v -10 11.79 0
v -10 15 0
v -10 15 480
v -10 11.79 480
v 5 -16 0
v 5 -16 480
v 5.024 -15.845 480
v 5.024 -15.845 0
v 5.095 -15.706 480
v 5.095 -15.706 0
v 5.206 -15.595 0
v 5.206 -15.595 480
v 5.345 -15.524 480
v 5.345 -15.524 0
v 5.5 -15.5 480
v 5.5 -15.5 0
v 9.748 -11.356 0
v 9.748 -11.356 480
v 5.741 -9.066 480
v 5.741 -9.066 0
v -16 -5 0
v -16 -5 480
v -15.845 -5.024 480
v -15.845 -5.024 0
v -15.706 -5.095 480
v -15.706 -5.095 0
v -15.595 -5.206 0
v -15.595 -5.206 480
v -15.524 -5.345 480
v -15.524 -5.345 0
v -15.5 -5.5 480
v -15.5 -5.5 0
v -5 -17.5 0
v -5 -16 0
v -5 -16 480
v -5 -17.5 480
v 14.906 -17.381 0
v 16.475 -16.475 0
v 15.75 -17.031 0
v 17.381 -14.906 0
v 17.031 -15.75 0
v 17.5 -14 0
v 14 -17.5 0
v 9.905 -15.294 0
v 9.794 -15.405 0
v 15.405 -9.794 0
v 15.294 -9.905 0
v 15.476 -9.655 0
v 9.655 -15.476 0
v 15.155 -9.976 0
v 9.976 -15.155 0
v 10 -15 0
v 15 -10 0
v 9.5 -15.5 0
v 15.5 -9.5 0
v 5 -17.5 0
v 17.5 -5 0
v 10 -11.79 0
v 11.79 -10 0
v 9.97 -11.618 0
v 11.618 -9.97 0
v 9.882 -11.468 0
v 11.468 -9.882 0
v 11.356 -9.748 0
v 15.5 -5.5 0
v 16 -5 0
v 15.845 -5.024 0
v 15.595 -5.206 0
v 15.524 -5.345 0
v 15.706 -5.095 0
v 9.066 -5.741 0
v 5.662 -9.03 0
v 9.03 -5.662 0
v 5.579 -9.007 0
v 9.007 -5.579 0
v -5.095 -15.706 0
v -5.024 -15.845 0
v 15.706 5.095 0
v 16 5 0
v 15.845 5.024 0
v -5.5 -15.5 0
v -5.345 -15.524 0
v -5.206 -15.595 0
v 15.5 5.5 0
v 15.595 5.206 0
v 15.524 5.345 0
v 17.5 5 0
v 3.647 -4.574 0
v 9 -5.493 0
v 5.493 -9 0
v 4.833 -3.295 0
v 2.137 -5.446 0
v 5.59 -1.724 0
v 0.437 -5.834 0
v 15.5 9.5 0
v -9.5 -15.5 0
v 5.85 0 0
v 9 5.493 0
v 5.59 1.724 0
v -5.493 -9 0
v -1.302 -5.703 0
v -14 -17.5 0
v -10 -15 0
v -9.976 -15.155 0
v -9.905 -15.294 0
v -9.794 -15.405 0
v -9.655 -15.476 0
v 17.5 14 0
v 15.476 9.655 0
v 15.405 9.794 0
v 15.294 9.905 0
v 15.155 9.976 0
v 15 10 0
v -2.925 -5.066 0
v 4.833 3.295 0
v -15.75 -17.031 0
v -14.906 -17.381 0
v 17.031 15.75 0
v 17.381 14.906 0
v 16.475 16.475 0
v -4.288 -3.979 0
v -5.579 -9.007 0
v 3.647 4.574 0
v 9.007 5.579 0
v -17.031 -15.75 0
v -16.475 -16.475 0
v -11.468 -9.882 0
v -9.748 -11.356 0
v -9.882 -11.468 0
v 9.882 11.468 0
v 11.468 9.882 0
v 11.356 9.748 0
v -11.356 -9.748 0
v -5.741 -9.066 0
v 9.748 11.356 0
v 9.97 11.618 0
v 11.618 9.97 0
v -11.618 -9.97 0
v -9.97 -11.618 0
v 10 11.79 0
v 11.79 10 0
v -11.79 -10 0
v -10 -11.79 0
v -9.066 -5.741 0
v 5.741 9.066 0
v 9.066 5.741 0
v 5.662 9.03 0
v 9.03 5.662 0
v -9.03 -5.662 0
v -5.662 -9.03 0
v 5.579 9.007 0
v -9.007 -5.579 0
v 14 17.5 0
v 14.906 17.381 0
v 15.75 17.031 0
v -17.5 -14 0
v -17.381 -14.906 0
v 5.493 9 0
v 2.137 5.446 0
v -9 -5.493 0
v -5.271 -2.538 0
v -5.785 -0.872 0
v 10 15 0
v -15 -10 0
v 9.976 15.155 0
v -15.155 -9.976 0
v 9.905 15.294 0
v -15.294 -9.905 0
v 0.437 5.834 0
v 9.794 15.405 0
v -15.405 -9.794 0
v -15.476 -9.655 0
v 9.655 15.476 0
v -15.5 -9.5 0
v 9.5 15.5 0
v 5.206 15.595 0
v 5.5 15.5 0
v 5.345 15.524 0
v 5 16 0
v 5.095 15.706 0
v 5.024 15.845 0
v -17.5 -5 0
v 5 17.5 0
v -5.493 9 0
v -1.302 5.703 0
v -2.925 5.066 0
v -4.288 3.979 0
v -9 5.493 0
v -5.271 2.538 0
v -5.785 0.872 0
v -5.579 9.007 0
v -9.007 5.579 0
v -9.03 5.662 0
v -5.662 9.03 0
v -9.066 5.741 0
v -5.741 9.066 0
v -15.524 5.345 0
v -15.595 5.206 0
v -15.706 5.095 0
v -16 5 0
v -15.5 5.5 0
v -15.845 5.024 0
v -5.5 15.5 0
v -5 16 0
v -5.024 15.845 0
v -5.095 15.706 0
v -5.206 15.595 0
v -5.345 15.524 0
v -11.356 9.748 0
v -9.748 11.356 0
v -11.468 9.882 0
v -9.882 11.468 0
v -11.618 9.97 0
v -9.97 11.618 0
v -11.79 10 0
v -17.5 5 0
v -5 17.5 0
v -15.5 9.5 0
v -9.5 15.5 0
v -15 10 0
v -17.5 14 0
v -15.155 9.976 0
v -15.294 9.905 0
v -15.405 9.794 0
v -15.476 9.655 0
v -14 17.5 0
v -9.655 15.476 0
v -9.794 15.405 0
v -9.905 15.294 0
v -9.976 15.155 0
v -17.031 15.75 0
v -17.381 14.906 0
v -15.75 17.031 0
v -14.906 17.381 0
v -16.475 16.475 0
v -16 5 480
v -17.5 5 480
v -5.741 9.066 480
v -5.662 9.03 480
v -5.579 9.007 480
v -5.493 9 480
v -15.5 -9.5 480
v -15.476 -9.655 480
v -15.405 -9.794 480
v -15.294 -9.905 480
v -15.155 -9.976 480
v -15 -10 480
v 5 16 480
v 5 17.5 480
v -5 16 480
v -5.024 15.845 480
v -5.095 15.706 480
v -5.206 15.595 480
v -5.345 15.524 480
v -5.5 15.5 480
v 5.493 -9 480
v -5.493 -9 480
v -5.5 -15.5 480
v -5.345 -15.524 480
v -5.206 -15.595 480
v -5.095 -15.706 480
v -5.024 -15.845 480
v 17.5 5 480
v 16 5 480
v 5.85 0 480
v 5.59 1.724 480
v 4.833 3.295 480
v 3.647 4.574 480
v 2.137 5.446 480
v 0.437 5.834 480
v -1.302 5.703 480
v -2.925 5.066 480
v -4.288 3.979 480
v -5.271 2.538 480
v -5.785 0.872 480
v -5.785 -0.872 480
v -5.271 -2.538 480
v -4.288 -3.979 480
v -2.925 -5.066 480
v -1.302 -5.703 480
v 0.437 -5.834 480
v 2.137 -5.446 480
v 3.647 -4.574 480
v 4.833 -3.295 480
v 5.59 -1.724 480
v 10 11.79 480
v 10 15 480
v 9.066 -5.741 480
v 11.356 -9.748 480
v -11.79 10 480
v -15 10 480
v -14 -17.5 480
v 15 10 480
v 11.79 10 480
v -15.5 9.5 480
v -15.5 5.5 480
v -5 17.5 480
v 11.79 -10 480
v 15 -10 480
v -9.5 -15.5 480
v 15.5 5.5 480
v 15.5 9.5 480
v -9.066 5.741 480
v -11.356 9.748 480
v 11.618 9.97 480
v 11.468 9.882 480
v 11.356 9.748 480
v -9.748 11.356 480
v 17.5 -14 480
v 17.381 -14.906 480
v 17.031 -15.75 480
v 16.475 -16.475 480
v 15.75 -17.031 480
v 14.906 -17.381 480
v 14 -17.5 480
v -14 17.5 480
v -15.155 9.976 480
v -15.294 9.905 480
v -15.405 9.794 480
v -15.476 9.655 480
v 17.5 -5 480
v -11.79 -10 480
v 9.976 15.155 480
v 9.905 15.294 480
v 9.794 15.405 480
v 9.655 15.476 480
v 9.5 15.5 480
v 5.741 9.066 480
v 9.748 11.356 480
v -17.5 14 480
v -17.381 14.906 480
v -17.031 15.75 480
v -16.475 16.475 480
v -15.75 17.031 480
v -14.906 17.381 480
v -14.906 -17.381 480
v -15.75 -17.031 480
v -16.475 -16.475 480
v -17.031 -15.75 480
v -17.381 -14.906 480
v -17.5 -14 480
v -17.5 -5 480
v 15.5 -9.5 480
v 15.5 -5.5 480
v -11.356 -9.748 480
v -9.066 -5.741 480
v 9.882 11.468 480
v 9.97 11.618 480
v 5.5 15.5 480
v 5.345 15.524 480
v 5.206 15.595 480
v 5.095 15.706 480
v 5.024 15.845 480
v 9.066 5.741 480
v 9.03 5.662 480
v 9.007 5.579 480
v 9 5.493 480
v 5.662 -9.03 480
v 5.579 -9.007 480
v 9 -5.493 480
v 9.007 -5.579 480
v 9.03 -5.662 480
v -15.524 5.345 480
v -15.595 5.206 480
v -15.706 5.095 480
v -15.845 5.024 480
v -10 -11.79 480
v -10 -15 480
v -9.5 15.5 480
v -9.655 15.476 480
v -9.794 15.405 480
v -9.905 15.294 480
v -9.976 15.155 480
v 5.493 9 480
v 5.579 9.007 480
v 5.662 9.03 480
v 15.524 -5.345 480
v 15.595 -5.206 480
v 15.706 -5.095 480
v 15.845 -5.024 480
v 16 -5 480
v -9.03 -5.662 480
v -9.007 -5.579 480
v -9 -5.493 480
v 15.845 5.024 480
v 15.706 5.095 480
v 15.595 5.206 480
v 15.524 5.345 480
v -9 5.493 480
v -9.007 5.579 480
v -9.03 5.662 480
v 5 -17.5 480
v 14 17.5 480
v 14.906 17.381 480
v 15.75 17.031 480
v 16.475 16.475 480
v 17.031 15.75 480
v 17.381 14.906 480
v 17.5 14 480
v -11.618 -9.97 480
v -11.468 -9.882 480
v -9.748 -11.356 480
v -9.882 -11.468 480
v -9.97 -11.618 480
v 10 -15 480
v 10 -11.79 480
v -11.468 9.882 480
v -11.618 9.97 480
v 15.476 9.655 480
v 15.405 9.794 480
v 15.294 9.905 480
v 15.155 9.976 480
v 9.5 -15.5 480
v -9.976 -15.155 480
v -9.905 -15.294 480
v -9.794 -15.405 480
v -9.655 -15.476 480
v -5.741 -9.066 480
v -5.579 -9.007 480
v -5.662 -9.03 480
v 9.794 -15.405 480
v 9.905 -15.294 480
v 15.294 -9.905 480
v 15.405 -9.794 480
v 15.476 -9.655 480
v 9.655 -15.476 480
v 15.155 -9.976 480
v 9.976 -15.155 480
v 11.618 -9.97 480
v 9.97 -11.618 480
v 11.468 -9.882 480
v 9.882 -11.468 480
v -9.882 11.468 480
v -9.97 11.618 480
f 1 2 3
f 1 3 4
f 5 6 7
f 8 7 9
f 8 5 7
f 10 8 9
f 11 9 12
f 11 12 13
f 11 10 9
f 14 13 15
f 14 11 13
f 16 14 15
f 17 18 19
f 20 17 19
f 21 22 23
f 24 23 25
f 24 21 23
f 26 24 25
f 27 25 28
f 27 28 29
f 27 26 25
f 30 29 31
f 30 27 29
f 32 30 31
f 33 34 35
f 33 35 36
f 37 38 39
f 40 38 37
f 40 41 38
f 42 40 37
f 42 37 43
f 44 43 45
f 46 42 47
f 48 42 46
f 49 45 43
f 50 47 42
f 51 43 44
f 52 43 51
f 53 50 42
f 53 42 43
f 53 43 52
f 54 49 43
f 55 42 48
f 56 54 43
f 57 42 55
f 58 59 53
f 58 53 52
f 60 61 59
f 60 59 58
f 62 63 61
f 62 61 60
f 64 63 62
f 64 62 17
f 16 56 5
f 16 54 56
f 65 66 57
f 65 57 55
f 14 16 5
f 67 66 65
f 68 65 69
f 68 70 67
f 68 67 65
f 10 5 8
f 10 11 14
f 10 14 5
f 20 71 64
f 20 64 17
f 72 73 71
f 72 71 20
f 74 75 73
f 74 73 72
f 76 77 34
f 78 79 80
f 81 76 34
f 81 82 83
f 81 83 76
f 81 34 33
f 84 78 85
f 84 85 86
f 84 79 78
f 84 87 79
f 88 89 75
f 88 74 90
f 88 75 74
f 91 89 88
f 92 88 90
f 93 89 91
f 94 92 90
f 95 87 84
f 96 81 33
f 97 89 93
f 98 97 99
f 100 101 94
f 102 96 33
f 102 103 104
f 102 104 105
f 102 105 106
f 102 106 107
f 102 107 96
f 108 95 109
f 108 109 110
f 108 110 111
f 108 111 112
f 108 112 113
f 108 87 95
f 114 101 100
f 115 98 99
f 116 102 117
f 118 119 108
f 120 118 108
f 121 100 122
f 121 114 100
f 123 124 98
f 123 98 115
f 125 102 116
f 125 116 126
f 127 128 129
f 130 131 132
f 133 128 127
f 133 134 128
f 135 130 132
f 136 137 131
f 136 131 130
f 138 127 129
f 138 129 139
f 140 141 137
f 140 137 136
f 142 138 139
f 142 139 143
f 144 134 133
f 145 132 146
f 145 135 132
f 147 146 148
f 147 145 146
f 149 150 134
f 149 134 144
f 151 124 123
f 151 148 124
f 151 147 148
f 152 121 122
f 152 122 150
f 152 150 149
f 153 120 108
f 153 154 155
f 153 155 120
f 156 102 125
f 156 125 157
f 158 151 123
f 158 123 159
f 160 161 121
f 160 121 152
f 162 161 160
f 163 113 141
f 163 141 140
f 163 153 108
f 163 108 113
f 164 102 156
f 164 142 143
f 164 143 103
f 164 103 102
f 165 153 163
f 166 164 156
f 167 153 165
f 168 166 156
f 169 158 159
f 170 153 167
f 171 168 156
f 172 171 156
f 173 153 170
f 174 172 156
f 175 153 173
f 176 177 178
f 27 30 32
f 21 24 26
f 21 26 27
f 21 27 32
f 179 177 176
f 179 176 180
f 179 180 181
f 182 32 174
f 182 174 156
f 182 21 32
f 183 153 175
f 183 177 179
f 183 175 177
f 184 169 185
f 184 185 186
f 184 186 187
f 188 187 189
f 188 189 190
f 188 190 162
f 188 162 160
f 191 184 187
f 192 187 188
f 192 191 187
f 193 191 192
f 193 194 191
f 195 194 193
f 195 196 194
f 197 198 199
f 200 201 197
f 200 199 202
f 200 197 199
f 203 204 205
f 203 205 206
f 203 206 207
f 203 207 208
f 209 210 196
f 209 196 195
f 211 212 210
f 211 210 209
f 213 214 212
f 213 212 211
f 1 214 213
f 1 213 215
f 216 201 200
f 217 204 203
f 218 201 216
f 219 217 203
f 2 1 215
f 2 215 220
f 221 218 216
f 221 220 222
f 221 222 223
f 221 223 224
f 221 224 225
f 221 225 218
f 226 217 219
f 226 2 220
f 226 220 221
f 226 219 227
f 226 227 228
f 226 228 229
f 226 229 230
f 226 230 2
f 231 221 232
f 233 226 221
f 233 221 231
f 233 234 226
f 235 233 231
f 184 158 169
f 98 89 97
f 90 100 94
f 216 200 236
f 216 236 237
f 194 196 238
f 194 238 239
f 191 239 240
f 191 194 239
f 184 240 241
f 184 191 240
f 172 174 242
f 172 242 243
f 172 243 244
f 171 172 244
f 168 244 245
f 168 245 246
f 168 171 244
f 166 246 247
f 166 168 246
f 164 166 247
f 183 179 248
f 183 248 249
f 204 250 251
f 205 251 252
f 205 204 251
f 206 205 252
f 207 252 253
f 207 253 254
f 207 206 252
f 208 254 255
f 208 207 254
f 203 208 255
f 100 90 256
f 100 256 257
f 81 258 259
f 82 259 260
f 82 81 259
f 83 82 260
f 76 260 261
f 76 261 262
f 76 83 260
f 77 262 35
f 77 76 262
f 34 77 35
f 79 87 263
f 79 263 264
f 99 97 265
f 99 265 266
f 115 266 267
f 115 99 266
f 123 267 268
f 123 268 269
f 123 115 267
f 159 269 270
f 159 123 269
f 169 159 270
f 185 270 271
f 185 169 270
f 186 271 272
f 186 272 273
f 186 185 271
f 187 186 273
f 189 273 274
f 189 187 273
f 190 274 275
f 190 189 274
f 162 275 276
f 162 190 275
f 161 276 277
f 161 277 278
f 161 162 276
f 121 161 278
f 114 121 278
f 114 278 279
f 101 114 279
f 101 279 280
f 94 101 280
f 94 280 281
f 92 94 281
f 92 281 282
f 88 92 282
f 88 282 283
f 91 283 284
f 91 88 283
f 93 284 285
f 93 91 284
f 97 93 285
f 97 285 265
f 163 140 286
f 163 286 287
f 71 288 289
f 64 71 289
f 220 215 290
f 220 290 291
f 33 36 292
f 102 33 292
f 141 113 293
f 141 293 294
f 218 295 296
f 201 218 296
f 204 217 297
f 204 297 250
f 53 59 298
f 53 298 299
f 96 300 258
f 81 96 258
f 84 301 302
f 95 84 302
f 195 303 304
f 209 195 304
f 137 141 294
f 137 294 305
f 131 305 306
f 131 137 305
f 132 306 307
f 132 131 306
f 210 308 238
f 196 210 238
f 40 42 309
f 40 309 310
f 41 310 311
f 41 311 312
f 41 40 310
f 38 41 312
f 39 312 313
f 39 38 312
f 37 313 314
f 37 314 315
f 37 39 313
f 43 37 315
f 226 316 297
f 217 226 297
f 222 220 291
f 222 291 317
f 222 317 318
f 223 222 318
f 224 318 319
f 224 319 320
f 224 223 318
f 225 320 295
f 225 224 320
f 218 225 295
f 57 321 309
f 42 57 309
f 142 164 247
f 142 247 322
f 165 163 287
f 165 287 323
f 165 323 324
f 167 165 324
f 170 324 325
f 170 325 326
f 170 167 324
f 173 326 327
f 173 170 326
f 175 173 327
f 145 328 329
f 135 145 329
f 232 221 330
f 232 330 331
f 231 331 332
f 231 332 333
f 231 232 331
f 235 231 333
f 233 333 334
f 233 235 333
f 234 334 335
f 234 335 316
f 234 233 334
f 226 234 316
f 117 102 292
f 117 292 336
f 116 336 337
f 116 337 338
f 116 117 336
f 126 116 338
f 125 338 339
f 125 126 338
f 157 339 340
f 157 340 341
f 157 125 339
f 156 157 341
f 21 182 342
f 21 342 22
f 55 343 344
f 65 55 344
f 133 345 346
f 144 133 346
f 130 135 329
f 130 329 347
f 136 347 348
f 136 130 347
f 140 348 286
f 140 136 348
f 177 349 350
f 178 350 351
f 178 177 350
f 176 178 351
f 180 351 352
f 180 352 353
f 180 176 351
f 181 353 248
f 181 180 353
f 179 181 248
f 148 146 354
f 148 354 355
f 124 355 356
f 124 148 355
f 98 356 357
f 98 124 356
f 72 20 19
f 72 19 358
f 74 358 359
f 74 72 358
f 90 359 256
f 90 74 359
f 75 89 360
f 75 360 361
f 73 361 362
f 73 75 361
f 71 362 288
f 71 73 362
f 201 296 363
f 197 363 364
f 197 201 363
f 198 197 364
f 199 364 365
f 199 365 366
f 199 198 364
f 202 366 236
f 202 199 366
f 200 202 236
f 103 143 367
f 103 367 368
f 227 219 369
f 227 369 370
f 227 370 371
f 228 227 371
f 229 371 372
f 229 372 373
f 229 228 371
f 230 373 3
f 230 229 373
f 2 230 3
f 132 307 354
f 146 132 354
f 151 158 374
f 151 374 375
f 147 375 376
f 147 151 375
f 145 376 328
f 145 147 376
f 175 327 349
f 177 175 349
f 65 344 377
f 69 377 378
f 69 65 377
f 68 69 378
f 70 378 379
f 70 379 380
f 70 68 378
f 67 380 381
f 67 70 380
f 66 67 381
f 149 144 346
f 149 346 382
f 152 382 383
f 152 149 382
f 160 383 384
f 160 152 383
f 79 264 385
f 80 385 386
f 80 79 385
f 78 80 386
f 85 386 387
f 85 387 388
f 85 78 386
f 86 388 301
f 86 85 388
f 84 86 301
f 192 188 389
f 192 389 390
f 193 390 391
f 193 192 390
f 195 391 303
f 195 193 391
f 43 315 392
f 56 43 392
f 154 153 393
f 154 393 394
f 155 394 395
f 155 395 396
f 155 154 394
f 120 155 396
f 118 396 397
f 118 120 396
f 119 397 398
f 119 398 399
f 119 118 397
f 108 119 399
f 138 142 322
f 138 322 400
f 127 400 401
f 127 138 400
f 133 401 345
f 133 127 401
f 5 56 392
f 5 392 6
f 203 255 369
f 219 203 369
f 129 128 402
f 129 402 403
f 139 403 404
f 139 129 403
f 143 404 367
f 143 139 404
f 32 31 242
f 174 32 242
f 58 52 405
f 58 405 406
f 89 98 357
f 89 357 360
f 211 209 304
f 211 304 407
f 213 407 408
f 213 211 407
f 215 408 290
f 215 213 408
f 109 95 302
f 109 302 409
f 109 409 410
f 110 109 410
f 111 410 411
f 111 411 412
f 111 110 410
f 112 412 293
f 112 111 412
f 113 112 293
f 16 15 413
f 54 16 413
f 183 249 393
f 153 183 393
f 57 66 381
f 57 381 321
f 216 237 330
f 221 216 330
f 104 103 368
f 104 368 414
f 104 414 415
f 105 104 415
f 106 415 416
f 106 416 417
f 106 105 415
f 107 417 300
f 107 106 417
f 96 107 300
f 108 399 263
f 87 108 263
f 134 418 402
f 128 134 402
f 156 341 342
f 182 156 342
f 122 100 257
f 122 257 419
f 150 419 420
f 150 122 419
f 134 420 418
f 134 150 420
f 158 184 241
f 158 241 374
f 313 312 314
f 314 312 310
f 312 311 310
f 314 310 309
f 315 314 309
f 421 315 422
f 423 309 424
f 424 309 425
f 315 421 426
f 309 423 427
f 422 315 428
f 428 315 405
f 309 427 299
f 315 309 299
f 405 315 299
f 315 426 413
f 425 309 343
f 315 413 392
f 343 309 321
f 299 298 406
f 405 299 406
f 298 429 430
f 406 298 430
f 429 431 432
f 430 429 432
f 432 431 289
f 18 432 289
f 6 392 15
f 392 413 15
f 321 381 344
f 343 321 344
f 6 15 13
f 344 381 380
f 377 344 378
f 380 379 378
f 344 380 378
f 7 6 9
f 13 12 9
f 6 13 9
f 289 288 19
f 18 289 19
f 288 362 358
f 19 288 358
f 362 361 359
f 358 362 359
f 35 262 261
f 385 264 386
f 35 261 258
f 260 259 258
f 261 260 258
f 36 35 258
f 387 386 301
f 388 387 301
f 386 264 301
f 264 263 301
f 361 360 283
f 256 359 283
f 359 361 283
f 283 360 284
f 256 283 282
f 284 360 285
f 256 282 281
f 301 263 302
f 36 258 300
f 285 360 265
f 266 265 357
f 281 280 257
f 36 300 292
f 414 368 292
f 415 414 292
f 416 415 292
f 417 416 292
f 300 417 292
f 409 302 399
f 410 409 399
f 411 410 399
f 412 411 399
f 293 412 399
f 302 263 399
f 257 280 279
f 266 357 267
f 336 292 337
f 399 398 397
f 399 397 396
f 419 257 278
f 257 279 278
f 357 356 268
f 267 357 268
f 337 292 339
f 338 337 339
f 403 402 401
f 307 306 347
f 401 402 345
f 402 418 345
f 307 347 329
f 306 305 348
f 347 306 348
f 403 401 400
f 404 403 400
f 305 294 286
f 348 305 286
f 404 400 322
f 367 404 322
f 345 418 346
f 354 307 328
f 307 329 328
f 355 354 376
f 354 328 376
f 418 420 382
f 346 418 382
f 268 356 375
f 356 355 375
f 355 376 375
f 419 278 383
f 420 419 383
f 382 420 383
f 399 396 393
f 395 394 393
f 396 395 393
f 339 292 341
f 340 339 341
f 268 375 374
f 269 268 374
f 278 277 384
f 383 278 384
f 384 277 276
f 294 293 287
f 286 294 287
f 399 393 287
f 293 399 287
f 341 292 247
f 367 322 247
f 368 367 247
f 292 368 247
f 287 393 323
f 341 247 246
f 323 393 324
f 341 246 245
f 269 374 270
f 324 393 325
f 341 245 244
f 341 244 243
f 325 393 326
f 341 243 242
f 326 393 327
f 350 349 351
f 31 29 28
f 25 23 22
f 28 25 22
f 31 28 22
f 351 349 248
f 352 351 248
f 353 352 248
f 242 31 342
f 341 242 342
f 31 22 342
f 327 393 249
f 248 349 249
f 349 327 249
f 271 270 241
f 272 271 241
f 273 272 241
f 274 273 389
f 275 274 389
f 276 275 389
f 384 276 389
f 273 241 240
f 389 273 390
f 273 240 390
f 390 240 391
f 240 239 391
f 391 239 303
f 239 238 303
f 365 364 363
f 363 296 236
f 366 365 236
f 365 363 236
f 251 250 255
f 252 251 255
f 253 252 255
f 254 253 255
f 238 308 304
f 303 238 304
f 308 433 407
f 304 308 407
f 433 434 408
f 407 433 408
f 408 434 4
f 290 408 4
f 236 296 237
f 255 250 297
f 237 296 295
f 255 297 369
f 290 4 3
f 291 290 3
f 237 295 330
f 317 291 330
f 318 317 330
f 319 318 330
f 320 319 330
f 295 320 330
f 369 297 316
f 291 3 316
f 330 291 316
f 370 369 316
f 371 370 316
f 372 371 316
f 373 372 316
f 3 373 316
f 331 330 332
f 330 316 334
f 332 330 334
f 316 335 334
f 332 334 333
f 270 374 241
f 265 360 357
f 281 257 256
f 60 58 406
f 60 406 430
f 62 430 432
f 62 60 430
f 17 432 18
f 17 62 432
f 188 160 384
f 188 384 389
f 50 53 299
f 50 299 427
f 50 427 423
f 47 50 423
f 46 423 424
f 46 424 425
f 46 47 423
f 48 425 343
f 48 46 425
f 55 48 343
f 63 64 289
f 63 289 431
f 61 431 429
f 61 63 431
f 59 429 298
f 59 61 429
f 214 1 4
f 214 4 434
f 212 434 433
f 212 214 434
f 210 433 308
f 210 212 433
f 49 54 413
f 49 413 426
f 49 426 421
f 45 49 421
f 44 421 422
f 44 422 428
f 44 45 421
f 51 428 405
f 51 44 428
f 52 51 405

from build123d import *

# Parameters (mm, degrees)
CROQUIS1_R              = 5.85
SALIENTE_EXTRUIR1_DEPTH = 480


with BuildPart() as part:
    # Croquis1 → Saliente-Extruir1 (new body)
    with BuildSketch(Plane.XY):
        with BuildLine():
            Line((-17.5, -5), (-16, -5))
            ThreePointArc((-16, -5), (-15.646446609, -5.146446609), (-15.5, -5.5))
            Line((-15.5, -5.5), (-15.5, -9.5))
            ThreePointArc((-15.5, -9.5), (-15.353553391, -9.853553391), (-15, -10))
            Line((-15, -10), (-11.790147321, -10))
            ThreePointArc((-11.790147321, -10), (-11.539192936, -9.932460283), (-11.356036103, -9.748087586))
            Line((-11.356036103, -9.748087586), (-9.065888782, -5.740718013))
            ThreePointArc((-9.065888782, -5.740718013), (-9.016752854, -5.620974478), (-9, -5.492630427))
            Line((-9, -5.492630427), (-9, 5.492630427))
            ThreePointArc((-9, 5.492630427), (-9.016752854, 5.620974478), (-9.065888782, 5.740718013))
            Line((-9.065888782, 5.740718013), (-11.356036103, 9.748087586))
            ThreePointArc((-11.356036103, 9.748087586), (-11.539192936, 9.932460283), (-11.790147321, 10))
            Line((-11.790147321, 10), (-15, 10))
            ThreePointArc((-15, 10), (-15.353553391, 9.853553391), (-15.5, 9.5))
            Line((-15.5, 9.5), (-15.5, 5.5))
            ThreePointArc((-15.5, 5.5), (-15.646446609, 5.146446609), (-16, 5))
            Line((-16, 5), (-17.5, 5))
            Line((-17.5, 5), (-17.5, 14))
            ThreePointArc((-17.5, 14), (-16.474873734, 16.474873734), (-14, 17.5))
            Line((-14, 17.5), (-5, 17.5))
            Line((-5, 17.5), (-5, 16))
            ThreePointArc((-5, 16), (-5.146446609, 15.646446609), (-5.5, 15.5))
            Line((-5.5, 15.5), (-9.5, 15.5))
            ThreePointArc((-9.5, 15.5), (-9.853553391, 15.353553391), (-10, 15))
            Line((-10, 15), (-10, 11.790147321))
            ThreePointArc((-10, 11.790147321), (-9.932460283, 11.539192936), (-9.748087586, 11.356036103))
            Line((-9.748087586, 11.356036103), (-5.740718013, 9.065888782))
            ThreePointArc((-5.740718013, 9.065888782), (-5.620974478, 9.016752854), (-5.492630427, 9))
            Line((-5.492630427, 9), (5.492630427, 9))
            ThreePointArc((5.492630427, 9), (5.620974478, 9.016752854), (5.740718013, 9.065888782))
            Line((5.740718013, 9.065888782), (9.748087586, 11.356036103))
            ThreePointArc((9.748087586, 11.356036103), (9.932460283, 11.539192936), (10, 11.790147321))
            Line((10, 11.790147321), (10, 15))
            ThreePointArc((10, 15), (9.853553391, 15.353553391), (9.5, 15.5))
            Line((9.5, 15.5), (5.5, 15.5))
            ThreePointArc((5.5, 15.5), (5.146446609, 15.646446609), (5, 16))
            Line((5, 16), (5, 17.5))
            Line((5, 17.5), (14, 17.5))
            ThreePointArc((14, 17.5), (16.474873734, 16.474873734), (17.5, 14))
            Line((17.5, 14), (17.5, 5))
            Line((17.5, 5), (16, 5))
            ThreePointArc((16, 5), (15.646446609, 5.146446609), (15.5, 5.5))
            Line((15.5, 5.5), (15.5, 9.5))
            ThreePointArc((15.5, 9.5), (15.353553391, 9.853553391), (15, 10))
            Line((15, 10), (11.790147321, 10))
            ThreePointArc((11.790147321, 10), (11.539192936, 9.932460283), (11.356036103, 9.748087586))
            Line((11.356036103, 9.748087586), (9.065888782, 5.740718013))
            ThreePointArc((9.065888782, 5.740718013), (9.016752854, 5.620974478), (9, 5.492630427))
            Line((9, 5.492630427), (9, -5.492630427))
            ThreePointArc((9, -5.492630427), (9.016752854, -5.620974478), (9.065888782, -5.740718013))
            Line((9.065888782, -5.740718013), (11.356036103, -9.748087586))
            ThreePointArc((11.356036103, -9.748087586), (11.539192936, -9.932460283), (11.790147321, -10))
            Line((11.790147321, -10), (15, -10))
            ThreePointArc((15, -10), (15.353553391, -9.853553391), (15.5, -9.5))
            Line((15.5, -9.5), (15.5, -5.5))
            ThreePointArc((15.5, -5.5), (15.646446609, -5.146446609), (16, -5))
            Line((16, -5), (17.5, -5))
            Line((17.5, -5), (17.5, -14))
            ThreePointArc((17.5, -14), (16.474873734, -16.474873734), (14, -17.5))
            Line((14, -17.5), (5, -17.5))
            Line((5, -17.5), (5, -16))
            ThreePointArc((5, -16), (5.146446609, -15.646446609), (5.5, -15.5))
            Line((5.5, -15.5), (9.5, -15.5))
            ThreePointArc((9.5, -15.5), (9.853553391, -15.353553391), (10, -15))
            Line((10, -15), (10, -11.790147321))
            ThreePointArc((10, -11.790147321), (9.932460283, -11.539192936), (9.748087586, -11.356036103))
            Line((9.748087586, -11.356036103), (5.740718013, -9.065888782))
            ThreePointArc((5.740718013, -9.065888782), (5.620974478, -9.016752854), (5.492630427, -9))
            Line((5.492630427, -9), (-5.492630427, -9))
            ThreePointArc((-5.492630427, -9), (-5.620974478, -9.016752854), (-5.740718013, -9.065888782))
            Line((-5.740718013, -9.065888782), (-9.748087586, -11.356036103))
            ThreePointArc((-9.748087586, -11.356036103), (-9.932460283, -11.539192936), (-10, -11.790147321))
            Line((-10, -11.790147321), (-10, -15))
            ThreePointArc((-10, -15), (-9.853553391, -15.353553391), (-9.5, -15.5))
            Line((-9.5, -15.5), (-5.5, -15.5))
            ThreePointArc((-5.5, -15.5), (-5.146446609, -15.646446609), (-5, -16))
            Line((-5, -16), (-5, -17.5))
            Line((-5, -17.5), (-14, -17.5))
            ThreePointArc((-14, -17.5), (-16.474873734, -16.474873734), (-17.5, -14))
            Line((-17.5, -14), (-17.5, -5))
        make_face()
        Circle(CROQUIS1_R, mode=Mode.SUBTRACT)
    extrude(amount=SALIENTE_EXTRUIR1_DEPTH)


solid = part.part
